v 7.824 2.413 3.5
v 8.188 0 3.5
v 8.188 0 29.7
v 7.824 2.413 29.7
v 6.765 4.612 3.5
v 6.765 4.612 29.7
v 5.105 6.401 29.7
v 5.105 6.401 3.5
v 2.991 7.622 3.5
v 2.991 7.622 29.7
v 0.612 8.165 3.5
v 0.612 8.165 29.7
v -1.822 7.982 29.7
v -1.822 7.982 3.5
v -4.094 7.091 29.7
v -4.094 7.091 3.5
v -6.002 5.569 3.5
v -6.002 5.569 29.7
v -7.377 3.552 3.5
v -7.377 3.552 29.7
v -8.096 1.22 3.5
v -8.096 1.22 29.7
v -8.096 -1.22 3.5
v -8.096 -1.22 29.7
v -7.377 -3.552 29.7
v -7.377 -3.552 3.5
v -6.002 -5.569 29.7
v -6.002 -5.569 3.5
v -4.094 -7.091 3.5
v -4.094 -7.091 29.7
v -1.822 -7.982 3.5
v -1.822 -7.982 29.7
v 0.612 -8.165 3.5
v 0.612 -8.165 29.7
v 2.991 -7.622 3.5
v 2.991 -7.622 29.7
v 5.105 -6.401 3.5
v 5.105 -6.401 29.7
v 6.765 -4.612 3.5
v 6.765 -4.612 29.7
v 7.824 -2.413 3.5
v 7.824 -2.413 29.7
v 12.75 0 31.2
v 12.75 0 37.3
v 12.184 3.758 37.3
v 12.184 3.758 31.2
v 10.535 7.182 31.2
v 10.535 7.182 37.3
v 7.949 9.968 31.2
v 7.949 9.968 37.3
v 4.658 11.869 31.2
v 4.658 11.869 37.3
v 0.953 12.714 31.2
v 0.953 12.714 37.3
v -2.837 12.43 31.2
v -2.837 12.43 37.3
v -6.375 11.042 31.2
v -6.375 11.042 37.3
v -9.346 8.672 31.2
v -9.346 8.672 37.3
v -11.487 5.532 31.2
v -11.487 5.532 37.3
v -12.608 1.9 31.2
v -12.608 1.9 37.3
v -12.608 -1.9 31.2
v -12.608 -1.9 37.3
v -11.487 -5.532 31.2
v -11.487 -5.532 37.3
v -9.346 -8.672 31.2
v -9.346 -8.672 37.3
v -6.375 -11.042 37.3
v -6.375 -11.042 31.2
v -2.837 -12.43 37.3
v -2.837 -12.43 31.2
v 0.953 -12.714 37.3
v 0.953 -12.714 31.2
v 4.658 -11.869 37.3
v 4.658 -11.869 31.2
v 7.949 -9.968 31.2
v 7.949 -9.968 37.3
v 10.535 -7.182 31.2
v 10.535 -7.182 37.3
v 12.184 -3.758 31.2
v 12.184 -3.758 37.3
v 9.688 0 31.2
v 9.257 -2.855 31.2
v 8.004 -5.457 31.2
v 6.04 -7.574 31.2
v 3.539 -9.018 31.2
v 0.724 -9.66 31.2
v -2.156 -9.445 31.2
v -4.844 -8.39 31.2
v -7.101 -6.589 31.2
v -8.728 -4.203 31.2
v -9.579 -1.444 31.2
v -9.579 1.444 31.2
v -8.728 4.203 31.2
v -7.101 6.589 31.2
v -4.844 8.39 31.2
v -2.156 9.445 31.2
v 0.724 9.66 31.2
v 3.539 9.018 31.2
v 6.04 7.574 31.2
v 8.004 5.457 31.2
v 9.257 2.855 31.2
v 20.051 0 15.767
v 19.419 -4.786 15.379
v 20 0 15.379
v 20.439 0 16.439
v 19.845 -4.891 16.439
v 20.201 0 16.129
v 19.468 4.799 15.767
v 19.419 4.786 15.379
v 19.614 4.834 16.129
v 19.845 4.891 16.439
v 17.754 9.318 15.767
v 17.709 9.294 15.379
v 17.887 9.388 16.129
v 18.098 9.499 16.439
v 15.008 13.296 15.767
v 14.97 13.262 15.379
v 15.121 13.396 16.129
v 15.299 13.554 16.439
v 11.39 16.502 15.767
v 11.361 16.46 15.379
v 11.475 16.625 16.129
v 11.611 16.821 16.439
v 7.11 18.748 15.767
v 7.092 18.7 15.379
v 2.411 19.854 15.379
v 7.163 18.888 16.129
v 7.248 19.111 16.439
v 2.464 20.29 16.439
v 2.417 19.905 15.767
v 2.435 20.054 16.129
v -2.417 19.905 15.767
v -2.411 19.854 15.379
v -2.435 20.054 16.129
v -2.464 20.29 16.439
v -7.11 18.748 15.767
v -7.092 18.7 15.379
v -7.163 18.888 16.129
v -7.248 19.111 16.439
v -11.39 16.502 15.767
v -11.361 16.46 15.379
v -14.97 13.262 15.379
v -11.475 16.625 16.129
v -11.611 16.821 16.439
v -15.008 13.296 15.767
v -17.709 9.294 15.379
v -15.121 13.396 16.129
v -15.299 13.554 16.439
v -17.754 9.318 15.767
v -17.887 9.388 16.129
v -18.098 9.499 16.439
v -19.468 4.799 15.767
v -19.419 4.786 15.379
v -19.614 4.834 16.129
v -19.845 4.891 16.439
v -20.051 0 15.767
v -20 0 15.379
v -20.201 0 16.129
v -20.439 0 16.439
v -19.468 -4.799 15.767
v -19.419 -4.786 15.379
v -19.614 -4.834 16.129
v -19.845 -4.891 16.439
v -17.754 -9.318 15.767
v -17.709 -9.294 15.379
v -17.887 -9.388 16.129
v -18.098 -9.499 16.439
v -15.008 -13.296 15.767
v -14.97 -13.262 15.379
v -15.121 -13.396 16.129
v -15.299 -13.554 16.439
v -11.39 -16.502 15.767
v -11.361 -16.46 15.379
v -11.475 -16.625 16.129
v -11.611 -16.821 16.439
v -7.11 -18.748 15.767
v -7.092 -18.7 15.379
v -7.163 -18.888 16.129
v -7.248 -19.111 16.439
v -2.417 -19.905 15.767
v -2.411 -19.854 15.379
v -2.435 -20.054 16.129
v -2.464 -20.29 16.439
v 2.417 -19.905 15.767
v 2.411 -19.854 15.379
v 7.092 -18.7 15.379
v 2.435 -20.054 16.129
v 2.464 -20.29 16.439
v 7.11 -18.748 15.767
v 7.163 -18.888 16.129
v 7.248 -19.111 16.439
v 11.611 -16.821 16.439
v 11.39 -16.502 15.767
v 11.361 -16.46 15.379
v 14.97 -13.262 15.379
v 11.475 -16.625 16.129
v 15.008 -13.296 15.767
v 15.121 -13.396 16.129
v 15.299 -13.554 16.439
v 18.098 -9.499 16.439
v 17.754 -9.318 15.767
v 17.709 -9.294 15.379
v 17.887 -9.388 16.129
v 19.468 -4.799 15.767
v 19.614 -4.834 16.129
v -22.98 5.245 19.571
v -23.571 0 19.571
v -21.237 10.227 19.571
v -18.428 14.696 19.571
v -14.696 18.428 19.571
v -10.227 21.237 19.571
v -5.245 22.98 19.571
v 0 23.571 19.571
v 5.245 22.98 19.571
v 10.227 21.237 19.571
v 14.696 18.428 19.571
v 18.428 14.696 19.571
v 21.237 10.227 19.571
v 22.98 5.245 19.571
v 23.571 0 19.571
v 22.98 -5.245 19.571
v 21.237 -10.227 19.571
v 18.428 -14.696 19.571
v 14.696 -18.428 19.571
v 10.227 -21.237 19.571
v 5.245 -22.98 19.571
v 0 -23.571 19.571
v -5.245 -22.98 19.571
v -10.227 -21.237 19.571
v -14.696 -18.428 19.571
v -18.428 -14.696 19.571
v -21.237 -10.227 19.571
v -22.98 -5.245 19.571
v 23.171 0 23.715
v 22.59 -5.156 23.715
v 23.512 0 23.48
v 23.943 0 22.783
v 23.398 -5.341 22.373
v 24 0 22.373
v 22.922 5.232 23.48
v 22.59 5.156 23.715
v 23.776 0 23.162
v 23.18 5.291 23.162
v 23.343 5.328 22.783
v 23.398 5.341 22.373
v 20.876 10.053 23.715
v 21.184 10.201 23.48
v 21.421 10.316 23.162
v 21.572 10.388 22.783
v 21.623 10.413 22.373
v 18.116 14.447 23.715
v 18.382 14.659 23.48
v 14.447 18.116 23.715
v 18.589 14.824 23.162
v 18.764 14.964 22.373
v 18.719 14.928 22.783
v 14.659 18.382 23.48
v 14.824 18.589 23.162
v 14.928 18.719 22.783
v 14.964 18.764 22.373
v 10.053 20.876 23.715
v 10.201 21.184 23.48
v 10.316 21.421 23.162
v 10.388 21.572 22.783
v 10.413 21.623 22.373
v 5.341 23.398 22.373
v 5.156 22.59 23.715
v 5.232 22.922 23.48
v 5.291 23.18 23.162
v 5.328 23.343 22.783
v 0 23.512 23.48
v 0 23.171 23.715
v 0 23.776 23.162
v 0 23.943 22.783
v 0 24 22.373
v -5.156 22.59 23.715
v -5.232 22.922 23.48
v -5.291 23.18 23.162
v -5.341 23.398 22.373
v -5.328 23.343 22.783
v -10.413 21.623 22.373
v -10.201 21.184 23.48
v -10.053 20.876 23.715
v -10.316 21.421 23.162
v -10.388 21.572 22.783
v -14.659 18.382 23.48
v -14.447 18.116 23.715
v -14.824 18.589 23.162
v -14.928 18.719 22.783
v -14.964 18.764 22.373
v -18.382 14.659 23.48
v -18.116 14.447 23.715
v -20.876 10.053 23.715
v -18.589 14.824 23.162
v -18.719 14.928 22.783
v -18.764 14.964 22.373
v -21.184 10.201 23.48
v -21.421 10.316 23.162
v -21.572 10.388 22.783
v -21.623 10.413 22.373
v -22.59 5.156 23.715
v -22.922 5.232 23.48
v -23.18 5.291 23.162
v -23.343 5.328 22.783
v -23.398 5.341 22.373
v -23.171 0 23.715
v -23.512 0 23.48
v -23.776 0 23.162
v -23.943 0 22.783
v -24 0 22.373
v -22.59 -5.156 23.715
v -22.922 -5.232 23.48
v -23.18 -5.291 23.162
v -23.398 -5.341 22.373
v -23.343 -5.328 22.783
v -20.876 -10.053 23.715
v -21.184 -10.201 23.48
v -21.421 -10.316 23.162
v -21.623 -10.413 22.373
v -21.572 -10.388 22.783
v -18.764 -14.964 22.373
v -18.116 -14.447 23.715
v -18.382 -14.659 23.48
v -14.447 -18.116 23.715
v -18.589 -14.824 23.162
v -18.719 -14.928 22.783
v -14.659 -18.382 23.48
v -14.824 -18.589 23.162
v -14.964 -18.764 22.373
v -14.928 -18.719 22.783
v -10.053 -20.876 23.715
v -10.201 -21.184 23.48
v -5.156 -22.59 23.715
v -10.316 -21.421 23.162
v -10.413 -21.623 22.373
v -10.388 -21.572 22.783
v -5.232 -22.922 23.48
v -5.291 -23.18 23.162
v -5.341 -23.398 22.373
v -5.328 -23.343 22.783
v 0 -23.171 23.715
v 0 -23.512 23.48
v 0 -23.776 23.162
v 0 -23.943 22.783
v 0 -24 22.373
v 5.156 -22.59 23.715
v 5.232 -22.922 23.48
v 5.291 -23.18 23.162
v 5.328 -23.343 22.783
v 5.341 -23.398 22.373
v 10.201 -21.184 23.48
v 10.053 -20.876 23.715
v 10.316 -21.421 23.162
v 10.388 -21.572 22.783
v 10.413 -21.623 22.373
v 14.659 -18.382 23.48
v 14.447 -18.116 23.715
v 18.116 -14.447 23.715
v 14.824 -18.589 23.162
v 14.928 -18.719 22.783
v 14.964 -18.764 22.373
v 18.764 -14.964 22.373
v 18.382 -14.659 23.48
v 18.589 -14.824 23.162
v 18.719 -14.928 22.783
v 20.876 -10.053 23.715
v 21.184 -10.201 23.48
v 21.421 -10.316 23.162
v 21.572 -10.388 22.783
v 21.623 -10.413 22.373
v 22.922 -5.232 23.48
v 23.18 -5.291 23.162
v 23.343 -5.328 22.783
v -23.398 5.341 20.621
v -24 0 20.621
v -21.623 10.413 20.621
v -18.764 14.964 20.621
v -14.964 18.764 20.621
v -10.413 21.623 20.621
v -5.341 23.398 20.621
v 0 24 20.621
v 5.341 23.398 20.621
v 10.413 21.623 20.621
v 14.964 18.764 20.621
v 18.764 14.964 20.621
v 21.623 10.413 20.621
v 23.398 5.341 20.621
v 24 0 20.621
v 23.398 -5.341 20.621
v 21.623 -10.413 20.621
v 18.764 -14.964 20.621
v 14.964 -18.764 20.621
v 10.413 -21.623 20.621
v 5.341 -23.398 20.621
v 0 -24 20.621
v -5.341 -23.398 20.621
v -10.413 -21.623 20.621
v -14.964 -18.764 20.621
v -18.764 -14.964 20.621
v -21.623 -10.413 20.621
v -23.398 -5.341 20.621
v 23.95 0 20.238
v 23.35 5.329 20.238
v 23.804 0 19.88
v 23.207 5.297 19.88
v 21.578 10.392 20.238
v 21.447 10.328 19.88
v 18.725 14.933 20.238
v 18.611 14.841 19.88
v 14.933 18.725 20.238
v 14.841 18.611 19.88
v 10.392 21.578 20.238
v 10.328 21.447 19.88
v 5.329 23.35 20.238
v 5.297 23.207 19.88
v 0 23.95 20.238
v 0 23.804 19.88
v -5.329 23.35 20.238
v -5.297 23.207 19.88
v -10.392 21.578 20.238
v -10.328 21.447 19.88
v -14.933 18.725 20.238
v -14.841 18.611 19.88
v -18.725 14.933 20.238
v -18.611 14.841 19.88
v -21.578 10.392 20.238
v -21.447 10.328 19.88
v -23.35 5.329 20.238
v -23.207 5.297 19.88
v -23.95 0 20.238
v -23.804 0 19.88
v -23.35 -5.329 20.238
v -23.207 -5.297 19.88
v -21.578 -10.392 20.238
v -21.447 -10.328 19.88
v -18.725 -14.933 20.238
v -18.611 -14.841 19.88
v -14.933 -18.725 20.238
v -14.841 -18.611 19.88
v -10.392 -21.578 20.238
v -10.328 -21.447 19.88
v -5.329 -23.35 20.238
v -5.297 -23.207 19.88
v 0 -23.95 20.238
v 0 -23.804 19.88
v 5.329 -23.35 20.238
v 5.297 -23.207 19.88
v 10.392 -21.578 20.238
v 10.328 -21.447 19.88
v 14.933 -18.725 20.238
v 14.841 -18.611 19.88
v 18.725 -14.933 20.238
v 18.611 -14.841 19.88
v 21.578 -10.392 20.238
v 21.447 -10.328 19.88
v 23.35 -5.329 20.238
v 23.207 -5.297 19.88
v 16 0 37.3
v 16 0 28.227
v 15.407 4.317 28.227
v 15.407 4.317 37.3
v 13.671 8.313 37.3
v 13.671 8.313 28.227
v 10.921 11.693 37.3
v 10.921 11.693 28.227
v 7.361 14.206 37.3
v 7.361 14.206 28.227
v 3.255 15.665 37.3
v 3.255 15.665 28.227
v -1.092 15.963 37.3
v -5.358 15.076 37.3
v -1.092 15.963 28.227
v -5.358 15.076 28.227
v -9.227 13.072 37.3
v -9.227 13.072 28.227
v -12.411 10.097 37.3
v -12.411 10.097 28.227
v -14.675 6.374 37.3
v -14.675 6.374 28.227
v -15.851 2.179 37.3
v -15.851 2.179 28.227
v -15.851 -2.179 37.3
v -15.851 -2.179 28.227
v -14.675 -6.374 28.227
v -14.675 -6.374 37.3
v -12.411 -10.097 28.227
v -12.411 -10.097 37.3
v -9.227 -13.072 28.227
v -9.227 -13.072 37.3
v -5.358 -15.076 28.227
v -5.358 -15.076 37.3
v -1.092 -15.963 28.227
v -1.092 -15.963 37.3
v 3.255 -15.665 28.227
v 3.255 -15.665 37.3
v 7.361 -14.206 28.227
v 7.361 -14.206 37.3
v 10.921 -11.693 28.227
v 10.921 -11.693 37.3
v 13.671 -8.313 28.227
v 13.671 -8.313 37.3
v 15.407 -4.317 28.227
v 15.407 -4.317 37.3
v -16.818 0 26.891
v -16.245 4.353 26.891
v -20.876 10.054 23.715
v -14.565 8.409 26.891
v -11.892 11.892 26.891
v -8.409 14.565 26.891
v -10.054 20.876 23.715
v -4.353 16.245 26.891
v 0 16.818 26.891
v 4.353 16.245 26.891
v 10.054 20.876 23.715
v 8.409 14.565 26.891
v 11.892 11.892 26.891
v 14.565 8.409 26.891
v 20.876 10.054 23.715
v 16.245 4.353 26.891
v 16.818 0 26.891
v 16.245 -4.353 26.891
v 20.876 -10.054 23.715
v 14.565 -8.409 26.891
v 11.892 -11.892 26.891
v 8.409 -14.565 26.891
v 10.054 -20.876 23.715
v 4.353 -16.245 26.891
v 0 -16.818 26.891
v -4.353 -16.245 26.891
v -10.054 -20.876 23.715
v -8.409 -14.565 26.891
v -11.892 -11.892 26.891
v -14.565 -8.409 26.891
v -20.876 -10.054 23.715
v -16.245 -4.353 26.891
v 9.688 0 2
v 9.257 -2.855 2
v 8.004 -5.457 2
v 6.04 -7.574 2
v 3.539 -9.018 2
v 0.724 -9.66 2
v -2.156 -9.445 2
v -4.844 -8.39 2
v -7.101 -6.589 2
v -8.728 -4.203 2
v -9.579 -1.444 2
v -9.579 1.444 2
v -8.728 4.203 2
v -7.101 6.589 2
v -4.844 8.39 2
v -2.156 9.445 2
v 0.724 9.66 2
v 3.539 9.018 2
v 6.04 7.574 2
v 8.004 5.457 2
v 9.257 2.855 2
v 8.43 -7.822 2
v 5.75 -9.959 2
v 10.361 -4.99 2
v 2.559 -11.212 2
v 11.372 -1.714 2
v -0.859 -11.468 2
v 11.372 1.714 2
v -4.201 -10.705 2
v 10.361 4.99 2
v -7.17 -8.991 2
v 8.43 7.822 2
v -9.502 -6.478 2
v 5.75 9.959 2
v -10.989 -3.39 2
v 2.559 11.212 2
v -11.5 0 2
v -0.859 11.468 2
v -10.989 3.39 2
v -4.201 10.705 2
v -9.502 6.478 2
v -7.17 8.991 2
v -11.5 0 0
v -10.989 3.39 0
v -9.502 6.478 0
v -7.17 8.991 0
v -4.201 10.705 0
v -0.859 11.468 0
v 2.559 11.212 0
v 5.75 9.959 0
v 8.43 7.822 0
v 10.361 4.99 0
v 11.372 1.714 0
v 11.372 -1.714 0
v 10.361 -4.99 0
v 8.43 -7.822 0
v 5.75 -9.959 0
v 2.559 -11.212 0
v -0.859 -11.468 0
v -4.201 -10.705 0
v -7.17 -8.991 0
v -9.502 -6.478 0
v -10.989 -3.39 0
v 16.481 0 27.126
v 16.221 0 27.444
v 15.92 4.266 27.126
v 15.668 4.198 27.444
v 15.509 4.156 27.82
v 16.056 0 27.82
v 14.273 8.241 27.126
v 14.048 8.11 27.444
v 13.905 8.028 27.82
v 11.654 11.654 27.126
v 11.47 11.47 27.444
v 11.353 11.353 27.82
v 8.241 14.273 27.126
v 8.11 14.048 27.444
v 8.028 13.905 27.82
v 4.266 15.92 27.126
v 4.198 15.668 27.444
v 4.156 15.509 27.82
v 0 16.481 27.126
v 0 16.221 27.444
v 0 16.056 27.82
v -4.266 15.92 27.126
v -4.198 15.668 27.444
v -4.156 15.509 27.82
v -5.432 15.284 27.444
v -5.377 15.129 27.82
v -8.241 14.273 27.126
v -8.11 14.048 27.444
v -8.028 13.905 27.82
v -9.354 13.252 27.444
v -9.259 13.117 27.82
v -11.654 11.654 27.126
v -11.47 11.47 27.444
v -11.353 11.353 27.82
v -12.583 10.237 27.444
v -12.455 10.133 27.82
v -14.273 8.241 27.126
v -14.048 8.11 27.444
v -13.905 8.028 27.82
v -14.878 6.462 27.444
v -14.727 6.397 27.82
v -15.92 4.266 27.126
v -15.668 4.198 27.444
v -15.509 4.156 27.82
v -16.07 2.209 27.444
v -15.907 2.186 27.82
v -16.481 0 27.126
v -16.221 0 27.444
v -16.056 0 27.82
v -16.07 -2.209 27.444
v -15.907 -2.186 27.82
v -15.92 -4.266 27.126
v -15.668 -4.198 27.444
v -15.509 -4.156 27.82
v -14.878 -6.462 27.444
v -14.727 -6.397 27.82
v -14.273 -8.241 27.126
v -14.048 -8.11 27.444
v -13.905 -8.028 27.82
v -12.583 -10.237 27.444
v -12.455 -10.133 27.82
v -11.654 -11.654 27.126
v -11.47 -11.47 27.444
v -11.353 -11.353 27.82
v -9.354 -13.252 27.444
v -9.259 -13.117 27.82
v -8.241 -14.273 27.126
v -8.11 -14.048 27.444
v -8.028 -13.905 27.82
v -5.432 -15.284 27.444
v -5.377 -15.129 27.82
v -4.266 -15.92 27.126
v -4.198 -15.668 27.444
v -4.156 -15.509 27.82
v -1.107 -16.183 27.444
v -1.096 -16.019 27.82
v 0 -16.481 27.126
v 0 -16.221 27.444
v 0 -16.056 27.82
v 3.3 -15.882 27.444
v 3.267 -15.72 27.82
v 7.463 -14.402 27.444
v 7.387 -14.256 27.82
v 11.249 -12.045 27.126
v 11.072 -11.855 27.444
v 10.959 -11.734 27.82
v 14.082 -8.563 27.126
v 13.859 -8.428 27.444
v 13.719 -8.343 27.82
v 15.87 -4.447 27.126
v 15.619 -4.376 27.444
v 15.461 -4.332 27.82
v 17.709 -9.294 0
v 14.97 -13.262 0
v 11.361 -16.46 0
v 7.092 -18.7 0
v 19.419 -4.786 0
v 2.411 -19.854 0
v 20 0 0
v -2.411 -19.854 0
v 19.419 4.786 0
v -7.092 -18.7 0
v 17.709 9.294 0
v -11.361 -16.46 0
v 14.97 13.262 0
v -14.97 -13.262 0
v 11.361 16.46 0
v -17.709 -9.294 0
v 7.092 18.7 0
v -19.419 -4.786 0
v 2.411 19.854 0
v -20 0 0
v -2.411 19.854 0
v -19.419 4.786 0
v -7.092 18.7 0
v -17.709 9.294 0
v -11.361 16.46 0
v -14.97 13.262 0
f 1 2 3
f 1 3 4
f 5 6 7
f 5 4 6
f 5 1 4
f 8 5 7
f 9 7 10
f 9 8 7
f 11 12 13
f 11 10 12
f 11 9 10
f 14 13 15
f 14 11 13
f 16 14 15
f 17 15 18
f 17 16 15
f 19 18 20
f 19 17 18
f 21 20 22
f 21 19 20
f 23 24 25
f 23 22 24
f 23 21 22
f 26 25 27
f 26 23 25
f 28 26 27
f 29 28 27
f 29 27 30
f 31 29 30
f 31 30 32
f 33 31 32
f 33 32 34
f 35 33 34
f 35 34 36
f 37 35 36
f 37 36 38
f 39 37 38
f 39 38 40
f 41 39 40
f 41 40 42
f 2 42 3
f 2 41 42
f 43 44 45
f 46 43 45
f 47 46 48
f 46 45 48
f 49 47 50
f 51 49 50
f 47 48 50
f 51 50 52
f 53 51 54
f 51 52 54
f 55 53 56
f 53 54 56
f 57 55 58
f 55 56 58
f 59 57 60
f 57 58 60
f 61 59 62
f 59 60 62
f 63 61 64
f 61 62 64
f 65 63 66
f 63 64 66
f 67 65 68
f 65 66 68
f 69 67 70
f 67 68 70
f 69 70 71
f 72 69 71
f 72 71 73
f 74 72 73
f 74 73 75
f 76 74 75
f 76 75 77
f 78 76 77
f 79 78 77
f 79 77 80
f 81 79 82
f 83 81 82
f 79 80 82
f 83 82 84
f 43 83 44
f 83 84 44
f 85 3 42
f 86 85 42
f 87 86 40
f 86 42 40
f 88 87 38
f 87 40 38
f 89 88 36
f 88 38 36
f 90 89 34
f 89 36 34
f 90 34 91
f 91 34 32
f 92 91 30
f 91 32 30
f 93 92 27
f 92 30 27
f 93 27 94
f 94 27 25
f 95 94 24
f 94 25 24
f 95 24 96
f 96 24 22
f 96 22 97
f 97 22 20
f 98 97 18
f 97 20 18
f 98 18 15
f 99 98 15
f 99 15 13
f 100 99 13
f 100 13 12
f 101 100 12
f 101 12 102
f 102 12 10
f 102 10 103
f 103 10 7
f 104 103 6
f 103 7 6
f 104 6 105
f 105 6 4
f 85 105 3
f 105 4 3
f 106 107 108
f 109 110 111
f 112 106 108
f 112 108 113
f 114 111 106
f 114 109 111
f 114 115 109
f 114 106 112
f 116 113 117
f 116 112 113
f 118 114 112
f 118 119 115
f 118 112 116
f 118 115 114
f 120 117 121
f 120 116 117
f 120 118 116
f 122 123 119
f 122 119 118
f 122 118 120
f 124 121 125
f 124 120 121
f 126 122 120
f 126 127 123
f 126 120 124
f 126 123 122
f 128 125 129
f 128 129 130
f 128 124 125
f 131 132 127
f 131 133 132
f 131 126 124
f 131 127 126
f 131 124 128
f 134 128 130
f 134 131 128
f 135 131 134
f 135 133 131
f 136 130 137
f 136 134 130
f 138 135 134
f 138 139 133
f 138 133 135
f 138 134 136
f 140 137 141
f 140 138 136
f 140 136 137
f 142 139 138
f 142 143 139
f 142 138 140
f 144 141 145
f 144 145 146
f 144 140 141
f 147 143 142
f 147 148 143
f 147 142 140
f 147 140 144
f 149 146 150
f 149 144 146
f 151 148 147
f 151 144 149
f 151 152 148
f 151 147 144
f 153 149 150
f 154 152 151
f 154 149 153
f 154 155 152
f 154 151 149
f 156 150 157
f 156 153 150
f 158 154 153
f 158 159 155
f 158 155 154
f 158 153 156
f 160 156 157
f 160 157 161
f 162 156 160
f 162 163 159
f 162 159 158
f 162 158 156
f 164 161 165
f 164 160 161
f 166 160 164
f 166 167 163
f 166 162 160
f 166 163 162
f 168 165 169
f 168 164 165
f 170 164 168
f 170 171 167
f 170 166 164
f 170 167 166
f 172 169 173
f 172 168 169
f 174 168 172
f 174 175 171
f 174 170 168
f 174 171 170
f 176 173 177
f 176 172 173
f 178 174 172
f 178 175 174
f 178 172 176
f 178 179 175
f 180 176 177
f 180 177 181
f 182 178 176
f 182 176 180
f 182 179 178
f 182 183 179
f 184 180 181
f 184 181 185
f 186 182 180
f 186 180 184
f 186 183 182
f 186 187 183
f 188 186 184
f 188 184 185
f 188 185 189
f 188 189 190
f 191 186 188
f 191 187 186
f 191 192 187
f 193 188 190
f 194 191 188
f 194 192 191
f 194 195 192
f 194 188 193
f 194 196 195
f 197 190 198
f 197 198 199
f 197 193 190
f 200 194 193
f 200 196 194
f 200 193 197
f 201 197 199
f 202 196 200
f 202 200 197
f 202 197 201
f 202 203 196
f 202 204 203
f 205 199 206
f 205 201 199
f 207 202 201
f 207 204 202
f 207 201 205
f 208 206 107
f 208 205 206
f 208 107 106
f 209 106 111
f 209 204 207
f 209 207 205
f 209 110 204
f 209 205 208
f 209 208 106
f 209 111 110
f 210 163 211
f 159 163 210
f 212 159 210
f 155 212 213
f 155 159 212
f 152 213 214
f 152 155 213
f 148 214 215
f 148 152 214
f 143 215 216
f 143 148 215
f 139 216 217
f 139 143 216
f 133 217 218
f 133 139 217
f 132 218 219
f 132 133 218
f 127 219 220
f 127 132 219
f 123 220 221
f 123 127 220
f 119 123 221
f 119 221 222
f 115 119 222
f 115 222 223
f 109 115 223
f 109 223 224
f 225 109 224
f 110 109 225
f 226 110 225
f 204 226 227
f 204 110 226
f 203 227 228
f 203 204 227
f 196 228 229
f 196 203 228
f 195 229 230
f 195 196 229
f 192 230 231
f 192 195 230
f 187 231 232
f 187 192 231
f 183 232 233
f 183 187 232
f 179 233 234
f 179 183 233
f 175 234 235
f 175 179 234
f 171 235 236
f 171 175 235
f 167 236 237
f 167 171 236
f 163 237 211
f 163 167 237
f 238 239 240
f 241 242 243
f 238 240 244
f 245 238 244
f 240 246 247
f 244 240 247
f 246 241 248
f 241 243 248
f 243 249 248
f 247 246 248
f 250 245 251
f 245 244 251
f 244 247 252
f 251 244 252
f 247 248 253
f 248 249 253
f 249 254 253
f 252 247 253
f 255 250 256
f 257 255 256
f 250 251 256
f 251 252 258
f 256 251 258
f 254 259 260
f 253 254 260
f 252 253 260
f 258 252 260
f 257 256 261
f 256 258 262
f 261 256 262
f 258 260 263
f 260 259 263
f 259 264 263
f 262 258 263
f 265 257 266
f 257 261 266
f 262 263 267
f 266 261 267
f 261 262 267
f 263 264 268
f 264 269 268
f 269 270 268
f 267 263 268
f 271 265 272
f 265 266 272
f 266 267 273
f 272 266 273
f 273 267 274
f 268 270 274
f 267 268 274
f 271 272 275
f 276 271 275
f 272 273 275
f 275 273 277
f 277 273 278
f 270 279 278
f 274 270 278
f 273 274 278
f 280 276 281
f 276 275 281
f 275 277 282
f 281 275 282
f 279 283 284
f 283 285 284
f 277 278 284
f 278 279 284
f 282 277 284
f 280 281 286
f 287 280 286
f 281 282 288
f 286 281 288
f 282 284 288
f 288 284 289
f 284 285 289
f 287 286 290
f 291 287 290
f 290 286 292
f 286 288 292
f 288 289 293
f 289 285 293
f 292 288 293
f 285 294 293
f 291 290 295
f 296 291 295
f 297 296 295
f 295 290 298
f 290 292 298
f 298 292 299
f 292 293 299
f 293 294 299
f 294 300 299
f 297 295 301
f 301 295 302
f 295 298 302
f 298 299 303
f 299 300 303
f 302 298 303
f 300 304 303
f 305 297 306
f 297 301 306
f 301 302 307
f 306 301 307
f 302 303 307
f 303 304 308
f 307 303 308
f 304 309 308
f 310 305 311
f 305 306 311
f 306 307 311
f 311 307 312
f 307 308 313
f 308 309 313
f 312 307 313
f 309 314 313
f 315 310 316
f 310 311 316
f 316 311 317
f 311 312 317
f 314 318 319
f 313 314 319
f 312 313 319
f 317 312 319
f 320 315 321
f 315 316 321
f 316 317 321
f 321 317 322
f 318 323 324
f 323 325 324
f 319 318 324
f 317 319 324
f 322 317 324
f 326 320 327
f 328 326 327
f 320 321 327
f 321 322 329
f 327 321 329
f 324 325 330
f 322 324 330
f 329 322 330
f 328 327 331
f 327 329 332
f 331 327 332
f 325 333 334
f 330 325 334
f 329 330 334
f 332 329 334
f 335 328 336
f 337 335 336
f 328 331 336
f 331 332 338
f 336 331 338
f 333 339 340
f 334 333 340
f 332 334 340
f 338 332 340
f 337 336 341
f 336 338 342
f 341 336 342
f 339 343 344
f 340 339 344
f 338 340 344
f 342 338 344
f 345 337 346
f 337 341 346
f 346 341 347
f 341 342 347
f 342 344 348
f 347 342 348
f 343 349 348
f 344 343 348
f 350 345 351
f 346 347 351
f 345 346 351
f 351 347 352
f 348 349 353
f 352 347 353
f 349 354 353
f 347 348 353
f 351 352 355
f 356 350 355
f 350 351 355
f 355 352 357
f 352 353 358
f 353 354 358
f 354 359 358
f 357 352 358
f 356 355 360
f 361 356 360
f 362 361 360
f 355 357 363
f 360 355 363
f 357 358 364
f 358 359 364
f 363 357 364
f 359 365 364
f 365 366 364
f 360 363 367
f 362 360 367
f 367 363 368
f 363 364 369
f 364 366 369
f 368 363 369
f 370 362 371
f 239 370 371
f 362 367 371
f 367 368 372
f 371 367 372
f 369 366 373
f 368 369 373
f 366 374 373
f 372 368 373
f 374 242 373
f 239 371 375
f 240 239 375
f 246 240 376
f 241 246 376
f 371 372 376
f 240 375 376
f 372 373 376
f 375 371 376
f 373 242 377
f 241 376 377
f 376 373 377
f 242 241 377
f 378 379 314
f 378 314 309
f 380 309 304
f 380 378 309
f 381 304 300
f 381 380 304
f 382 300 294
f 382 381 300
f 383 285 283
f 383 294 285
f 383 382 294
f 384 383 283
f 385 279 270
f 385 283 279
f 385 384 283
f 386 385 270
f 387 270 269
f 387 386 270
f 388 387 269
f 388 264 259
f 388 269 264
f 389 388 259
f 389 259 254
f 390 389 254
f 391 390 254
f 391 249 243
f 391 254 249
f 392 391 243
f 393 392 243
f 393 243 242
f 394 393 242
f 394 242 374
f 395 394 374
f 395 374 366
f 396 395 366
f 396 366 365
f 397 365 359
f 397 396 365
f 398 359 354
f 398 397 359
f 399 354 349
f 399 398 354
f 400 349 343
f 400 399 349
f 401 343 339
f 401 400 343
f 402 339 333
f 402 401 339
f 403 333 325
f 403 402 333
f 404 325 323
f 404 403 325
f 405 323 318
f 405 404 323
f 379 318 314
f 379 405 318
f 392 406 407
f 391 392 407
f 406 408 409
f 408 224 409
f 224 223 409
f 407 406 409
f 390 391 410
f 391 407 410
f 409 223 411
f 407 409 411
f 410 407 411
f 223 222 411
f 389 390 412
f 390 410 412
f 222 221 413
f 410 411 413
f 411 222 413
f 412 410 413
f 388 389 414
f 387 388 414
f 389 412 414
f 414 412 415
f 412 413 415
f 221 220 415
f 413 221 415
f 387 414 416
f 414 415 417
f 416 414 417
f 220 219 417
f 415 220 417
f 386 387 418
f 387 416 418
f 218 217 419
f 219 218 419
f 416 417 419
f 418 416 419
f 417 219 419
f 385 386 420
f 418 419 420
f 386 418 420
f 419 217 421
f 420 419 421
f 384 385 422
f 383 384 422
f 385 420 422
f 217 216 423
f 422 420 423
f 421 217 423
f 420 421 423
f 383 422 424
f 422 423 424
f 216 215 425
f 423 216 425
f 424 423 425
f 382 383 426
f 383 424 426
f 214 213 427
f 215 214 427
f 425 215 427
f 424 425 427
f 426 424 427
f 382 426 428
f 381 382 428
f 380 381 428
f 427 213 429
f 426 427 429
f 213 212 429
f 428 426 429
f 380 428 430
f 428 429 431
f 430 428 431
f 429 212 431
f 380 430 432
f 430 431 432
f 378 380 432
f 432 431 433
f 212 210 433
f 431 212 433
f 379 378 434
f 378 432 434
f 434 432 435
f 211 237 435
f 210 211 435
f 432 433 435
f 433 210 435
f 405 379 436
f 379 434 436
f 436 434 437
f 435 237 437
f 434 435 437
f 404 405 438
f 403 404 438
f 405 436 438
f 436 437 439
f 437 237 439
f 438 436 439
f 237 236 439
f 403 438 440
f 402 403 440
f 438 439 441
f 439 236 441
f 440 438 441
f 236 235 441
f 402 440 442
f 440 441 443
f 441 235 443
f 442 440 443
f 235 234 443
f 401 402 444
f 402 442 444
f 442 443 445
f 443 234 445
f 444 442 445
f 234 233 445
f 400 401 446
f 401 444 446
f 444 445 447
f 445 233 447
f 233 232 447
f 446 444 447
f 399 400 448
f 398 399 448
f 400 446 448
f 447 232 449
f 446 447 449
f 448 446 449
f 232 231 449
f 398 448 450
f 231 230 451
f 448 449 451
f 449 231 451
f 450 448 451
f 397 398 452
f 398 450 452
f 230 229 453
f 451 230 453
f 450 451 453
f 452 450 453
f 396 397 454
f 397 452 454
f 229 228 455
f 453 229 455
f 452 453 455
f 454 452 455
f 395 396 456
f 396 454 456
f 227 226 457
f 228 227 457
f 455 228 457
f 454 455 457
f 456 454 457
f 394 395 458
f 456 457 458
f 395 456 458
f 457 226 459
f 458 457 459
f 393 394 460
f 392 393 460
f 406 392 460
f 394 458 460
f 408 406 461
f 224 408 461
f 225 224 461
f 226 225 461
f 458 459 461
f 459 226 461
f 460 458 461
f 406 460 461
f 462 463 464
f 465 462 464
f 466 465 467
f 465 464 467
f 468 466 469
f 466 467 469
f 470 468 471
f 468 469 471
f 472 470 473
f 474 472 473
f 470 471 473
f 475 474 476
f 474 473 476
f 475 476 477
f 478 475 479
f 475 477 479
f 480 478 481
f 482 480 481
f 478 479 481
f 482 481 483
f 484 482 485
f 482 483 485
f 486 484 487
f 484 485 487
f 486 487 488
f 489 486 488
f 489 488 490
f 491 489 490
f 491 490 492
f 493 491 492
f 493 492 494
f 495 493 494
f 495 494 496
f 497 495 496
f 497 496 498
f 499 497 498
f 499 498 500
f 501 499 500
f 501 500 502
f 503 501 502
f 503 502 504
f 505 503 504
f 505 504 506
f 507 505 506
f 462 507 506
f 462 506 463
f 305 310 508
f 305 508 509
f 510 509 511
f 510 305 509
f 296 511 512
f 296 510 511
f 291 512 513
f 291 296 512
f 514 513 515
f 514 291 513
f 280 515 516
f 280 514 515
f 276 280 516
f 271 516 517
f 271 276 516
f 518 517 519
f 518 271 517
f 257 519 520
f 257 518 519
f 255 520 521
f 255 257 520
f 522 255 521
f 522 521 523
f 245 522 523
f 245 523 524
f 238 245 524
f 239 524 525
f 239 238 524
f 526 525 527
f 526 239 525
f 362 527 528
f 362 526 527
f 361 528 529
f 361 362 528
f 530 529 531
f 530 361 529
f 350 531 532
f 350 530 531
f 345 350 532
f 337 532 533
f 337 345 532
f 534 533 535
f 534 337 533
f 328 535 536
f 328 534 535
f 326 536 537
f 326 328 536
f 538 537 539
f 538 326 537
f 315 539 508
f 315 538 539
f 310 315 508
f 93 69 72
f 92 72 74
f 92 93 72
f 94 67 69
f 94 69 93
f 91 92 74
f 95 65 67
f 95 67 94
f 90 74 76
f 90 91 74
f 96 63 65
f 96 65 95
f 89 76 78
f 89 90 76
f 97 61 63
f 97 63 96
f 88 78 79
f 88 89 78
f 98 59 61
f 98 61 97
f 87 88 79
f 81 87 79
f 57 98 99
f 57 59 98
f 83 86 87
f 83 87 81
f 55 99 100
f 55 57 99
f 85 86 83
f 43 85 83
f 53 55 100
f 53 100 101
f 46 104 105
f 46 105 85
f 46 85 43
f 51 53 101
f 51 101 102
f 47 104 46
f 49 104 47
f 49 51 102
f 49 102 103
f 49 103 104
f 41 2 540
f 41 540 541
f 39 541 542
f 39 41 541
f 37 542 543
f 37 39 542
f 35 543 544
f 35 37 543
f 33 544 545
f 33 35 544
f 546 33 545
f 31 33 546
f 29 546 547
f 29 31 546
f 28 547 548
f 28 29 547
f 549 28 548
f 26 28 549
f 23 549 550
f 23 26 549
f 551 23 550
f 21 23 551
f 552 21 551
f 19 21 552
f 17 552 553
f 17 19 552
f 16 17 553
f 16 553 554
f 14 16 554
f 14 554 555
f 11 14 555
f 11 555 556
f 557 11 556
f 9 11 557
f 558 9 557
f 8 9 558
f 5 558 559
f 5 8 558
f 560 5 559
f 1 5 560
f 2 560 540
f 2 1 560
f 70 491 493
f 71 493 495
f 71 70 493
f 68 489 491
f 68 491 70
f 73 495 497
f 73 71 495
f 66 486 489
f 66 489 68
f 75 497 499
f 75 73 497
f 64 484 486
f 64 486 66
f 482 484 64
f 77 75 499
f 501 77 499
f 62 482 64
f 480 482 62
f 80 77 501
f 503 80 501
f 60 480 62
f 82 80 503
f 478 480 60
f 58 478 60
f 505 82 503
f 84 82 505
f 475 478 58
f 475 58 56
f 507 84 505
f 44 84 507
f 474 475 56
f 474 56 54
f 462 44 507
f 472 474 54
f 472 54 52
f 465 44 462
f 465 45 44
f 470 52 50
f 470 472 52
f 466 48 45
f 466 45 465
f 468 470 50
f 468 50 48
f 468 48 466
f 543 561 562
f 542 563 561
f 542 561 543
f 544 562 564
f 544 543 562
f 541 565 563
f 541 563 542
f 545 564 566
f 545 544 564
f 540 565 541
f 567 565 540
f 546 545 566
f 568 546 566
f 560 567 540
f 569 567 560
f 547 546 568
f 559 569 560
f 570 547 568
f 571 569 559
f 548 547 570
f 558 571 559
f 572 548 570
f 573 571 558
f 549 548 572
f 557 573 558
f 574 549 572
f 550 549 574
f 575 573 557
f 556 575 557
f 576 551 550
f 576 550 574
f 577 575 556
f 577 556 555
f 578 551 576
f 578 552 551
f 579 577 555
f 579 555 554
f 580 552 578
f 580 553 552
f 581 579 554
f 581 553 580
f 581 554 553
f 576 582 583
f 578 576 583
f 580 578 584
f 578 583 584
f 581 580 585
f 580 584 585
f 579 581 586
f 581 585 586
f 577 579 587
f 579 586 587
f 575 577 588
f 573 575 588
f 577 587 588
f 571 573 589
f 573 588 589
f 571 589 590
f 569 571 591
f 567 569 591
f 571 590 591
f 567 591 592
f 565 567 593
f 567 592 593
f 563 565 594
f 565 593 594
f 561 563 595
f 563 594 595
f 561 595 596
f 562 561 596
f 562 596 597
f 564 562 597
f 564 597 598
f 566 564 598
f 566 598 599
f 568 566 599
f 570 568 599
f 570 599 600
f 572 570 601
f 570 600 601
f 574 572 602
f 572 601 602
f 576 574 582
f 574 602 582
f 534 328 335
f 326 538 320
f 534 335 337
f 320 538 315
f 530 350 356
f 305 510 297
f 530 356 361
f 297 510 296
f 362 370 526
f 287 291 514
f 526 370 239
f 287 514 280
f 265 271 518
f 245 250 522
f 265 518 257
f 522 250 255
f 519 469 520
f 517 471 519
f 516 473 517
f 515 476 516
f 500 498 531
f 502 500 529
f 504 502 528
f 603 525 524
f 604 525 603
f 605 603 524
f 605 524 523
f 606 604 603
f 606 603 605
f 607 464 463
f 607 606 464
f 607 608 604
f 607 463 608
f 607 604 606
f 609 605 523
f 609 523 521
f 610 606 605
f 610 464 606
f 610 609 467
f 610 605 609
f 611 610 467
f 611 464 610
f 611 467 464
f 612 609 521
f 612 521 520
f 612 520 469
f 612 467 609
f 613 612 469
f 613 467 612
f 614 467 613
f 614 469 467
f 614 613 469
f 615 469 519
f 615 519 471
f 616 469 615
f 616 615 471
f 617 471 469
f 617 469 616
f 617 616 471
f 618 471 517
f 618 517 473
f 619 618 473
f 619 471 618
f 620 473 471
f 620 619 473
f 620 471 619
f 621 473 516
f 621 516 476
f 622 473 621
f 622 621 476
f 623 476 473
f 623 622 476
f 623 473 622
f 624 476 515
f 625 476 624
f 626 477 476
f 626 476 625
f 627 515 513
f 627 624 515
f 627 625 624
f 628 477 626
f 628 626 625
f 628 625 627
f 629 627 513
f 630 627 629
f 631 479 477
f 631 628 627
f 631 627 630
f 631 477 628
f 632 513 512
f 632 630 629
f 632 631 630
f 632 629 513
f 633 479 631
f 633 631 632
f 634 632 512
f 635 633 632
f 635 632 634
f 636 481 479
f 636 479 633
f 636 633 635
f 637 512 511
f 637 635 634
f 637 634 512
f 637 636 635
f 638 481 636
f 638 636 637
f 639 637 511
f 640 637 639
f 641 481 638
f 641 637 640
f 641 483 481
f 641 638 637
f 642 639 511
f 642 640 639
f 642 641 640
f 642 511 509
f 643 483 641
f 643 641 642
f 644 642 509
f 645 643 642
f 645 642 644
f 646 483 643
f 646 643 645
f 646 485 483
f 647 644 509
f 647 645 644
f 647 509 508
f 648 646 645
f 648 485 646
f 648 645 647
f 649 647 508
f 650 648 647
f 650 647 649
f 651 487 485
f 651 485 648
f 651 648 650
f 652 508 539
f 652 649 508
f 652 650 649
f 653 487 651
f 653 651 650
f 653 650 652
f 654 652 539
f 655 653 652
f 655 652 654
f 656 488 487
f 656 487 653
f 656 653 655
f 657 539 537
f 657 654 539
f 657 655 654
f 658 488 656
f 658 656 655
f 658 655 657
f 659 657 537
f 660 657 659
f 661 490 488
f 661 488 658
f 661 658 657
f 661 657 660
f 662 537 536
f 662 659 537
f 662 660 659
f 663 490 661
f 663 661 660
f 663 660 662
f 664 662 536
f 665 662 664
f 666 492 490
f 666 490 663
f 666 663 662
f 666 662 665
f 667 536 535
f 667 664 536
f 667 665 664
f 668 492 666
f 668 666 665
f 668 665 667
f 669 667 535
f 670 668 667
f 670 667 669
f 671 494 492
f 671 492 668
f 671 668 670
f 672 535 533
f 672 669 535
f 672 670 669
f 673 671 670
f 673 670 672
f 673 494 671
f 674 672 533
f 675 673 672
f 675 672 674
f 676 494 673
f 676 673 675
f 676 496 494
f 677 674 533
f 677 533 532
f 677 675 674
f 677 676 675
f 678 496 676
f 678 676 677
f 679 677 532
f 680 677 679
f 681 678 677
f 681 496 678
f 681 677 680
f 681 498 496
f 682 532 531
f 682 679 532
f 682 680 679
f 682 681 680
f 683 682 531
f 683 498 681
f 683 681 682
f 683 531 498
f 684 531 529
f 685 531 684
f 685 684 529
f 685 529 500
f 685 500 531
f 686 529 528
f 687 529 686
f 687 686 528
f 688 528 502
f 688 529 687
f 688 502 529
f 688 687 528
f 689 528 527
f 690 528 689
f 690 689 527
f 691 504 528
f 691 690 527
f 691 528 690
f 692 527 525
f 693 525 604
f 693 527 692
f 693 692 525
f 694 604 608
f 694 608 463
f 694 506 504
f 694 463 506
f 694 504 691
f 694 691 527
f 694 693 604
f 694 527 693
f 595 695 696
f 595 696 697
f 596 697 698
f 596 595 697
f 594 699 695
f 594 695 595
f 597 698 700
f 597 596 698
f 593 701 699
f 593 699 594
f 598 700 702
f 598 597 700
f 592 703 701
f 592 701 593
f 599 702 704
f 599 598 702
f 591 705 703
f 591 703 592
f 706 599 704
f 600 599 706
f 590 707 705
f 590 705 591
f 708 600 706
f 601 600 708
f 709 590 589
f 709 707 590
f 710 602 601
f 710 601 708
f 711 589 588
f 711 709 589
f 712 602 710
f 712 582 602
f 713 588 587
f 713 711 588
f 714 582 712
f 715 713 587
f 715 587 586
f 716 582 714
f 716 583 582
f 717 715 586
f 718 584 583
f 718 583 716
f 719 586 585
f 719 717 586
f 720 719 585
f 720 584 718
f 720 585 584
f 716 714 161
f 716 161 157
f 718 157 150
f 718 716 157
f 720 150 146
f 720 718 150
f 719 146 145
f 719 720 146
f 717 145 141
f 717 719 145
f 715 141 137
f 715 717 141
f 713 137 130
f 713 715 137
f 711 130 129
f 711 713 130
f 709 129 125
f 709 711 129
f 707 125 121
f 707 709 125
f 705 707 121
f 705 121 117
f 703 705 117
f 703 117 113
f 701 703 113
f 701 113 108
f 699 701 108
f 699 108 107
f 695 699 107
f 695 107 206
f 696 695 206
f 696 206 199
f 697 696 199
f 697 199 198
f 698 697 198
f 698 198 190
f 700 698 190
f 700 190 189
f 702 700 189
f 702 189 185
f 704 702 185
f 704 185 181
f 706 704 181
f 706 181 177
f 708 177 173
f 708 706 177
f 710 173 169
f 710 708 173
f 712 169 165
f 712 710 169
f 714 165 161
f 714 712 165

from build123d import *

# Parameters (mm, degrees)
SKETCH1_R           = 21
SKETCH1_R_2         = 8.1875
BOSS_EXTRUDE1_DEPTH = 37.3
SKETCH2_R           = 24
SKETCH2_R_2         = 21
BOSS_EXTRUDE2_DEPTH = 27.3
SKETCH3_R           = 12.75
CUT_EXTRUDE1_DEPTH  = 6.1
SKETCH4_R           = 11.5
CUT_EXTRUDE2_DEPTH  = 2
MOVE_FACE2_BY       = 5
SKETCH6_R           = 24
SKETCH6_R_2         = 20
CUT_EXTRUDE3_DEPTH  = 20
CHAMFER1_SIZE2      = 4
CHAMFER1_SIZE       = 8
CHAMFER2_SIZE       = 1.5
CHAMFER3_SIZE       = 4


with BuildPart() as part:
    # Sketch1 → Boss-Extrude1 (new body)
    with BuildSketch(Plane.XY):
        Circle(SKETCH1_R)
        Circle(SKETCH1_R_2, mode=Mode.SUBTRACT)
    extrude(amount=BOSS_EXTRUDE1_DEPTH)

    # Sketch2 → Boss-Extrude2 (add)
    with BuildSketch(Plane(origin=(0, 0, 0), x_dir=(-1, 0, 0), z_dir=(0, 0, -1))):
        Circle(SKETCH2_R)
        with Locations(Location((0, 0, 0), (0, 0, 180))):
            Circle(SKETCH2_R_2, mode=Mode.SUBTRACT)
    extrude(amount=-BOSS_EXTRUDE2_DEPTH)

    # Sketch3 → Cut-Extrude1 (cut)
    with BuildSketch(Plane.XY.offset(37.3)):
        Circle(SKETCH3_R)
    extrude(amount=-CUT_EXTRUDE1_DEPTH, mode=Mode.SUBTRACT)

    # Sketch4 → Cut-Extrude2 (cut)
    with BuildSketch(Plane(origin=(0, 0, 0), x_dir=(-1, 0, 0), z_dir=(0, 0, -1))):
        Circle(SKETCH4_R)
    extrude(amount=-CUT_EXTRUDE2_DEPTH, mode=Mode.SUBTRACT)

    # Move Face2: a curved face moved inward by 5.0
    add(Solid.thicken(part.faces().sort_by_distance((-21, 0, 32.3))[0], -MOVE_FACE2_BY), mode=Mode.SUBTRACT)

    # Sketch6 → Cut-Extrude3 (cut)
    with BuildSketch(Plane(origin=(0, 0, 0), x_dir=(-1, 0, 0), z_dir=(0, 0, -1))):
        Circle(SKETCH6_R)
        Circle(SKETCH6_R_2, mode=Mode.SUBTRACT)
    extrude(amount=-CUT_EXTRUDE3_DEPTH, mode=Mode.SUBTRACT)

    # Chamfer1
    chamfer1_edges = [part.edges().sort_by_distance(p)[0] for p in [
        (24, 0, 27.3),
    ]]
    chamfer1_side = [part.faces().sort_by_distance(p)[0] for p in [
        (23.92, 0, 27.3),
    ]]
    chamfer(chamfer1_edges, length=CHAMFER1_SIZE - 0.0001, length2=CHAMFER1_SIZE2 - 0.0001, reference=chamfer1_side[0])  # a hair under: the kernel refuses the full size

    # Chamfer2
    chamfer2_edges = [part.edges().sort_by_distance(p)[0] for p in [
        (-8.1875, 0, 31.2),
        (-8.1875, 0, 2),
    ]]
    chamfer(chamfer2_edges, length=CHAMFER2_SIZE)

    # Fillet1: read off the stored shape, not the designer's step
    # Fillet1 outline → Fillet1 (revolve, cut)
    with BuildSketch(Plane.XZ):
        with BuildLine():
            ThreePointArc((23.170820393, 23.714589803), (23.775976213, 23.161545685), (24, 22.372949017))
            Line((24, 22.372949017), (24, 23.714589803))
            Line((24, 23.714589803), (23.170820393, 23.714589803))
        make_face()
    revolve(axis=Axis((0, 0, 0), (0, 0, 1)), mode=Mode.SUBTRACT)

    # Fillet1 2 outline → Fillet1 2 (revolve)
    with BuildSketch(Plane.XZ):
        with BuildLine():
            Line((16, 26.885410197), (16.829179607, 26.885410197))
            ThreePointArc((16.829179607, 26.885410197), (16.224023787, 27.438454315), (16, 28.227050983))
            Line((16, 28.227050983), (16, 26.885410197))
        make_face()
    revolve(axis=Axis((0, 0, 0), (0, 0, 1)))

    # Chamfer3
    chamfer3_edges = [part.edges().sort_by_distance(p)[0] for p in [
        (20, 0, 20),
    ]]
    chamfer(chamfer3_edges, length=CHAMFER3_SIZE - 0.0001)  # a hair under: the kernel refuses the full size

    # Fillet3: read off the stored shape, not the designer's step
    # Fillet3 outline → Fillet3 (revolve, cut)
    with BuildSketch(Plane.XZ):
        with BuildLine():
            ThreePointArc((24, 20.621320344), (23.885819299, 20.047295195), (23.560660172, 19.560660172))
            Line((23.560660172, 19.560660172), (24, 19.560660172))
            Line((24, 19.560660172), (24, 20.621320344))
        make_face()
    revolve(axis=Axis((0, 0, 0), (0, 0, 1)), mode=Mode.SUBTRACT)

    # Fillet3 2 outline → Fillet3 2 (revolve)
    with BuildSketch(Plane.XZ):
        with BuildLine():
            ThreePointArc((20, 15.378679656), (20.114180701, 15.952704805), (20.439339828, 16.439339828))
            Line((20.439339828, 16.439339828), (20, 16.439339828))
            Line((20, 16.439339828), (20, 15.378679656))
        make_face()
    revolve(axis=Axis((0, 0, 0), (0, 0, 1)))


solid = part.part
